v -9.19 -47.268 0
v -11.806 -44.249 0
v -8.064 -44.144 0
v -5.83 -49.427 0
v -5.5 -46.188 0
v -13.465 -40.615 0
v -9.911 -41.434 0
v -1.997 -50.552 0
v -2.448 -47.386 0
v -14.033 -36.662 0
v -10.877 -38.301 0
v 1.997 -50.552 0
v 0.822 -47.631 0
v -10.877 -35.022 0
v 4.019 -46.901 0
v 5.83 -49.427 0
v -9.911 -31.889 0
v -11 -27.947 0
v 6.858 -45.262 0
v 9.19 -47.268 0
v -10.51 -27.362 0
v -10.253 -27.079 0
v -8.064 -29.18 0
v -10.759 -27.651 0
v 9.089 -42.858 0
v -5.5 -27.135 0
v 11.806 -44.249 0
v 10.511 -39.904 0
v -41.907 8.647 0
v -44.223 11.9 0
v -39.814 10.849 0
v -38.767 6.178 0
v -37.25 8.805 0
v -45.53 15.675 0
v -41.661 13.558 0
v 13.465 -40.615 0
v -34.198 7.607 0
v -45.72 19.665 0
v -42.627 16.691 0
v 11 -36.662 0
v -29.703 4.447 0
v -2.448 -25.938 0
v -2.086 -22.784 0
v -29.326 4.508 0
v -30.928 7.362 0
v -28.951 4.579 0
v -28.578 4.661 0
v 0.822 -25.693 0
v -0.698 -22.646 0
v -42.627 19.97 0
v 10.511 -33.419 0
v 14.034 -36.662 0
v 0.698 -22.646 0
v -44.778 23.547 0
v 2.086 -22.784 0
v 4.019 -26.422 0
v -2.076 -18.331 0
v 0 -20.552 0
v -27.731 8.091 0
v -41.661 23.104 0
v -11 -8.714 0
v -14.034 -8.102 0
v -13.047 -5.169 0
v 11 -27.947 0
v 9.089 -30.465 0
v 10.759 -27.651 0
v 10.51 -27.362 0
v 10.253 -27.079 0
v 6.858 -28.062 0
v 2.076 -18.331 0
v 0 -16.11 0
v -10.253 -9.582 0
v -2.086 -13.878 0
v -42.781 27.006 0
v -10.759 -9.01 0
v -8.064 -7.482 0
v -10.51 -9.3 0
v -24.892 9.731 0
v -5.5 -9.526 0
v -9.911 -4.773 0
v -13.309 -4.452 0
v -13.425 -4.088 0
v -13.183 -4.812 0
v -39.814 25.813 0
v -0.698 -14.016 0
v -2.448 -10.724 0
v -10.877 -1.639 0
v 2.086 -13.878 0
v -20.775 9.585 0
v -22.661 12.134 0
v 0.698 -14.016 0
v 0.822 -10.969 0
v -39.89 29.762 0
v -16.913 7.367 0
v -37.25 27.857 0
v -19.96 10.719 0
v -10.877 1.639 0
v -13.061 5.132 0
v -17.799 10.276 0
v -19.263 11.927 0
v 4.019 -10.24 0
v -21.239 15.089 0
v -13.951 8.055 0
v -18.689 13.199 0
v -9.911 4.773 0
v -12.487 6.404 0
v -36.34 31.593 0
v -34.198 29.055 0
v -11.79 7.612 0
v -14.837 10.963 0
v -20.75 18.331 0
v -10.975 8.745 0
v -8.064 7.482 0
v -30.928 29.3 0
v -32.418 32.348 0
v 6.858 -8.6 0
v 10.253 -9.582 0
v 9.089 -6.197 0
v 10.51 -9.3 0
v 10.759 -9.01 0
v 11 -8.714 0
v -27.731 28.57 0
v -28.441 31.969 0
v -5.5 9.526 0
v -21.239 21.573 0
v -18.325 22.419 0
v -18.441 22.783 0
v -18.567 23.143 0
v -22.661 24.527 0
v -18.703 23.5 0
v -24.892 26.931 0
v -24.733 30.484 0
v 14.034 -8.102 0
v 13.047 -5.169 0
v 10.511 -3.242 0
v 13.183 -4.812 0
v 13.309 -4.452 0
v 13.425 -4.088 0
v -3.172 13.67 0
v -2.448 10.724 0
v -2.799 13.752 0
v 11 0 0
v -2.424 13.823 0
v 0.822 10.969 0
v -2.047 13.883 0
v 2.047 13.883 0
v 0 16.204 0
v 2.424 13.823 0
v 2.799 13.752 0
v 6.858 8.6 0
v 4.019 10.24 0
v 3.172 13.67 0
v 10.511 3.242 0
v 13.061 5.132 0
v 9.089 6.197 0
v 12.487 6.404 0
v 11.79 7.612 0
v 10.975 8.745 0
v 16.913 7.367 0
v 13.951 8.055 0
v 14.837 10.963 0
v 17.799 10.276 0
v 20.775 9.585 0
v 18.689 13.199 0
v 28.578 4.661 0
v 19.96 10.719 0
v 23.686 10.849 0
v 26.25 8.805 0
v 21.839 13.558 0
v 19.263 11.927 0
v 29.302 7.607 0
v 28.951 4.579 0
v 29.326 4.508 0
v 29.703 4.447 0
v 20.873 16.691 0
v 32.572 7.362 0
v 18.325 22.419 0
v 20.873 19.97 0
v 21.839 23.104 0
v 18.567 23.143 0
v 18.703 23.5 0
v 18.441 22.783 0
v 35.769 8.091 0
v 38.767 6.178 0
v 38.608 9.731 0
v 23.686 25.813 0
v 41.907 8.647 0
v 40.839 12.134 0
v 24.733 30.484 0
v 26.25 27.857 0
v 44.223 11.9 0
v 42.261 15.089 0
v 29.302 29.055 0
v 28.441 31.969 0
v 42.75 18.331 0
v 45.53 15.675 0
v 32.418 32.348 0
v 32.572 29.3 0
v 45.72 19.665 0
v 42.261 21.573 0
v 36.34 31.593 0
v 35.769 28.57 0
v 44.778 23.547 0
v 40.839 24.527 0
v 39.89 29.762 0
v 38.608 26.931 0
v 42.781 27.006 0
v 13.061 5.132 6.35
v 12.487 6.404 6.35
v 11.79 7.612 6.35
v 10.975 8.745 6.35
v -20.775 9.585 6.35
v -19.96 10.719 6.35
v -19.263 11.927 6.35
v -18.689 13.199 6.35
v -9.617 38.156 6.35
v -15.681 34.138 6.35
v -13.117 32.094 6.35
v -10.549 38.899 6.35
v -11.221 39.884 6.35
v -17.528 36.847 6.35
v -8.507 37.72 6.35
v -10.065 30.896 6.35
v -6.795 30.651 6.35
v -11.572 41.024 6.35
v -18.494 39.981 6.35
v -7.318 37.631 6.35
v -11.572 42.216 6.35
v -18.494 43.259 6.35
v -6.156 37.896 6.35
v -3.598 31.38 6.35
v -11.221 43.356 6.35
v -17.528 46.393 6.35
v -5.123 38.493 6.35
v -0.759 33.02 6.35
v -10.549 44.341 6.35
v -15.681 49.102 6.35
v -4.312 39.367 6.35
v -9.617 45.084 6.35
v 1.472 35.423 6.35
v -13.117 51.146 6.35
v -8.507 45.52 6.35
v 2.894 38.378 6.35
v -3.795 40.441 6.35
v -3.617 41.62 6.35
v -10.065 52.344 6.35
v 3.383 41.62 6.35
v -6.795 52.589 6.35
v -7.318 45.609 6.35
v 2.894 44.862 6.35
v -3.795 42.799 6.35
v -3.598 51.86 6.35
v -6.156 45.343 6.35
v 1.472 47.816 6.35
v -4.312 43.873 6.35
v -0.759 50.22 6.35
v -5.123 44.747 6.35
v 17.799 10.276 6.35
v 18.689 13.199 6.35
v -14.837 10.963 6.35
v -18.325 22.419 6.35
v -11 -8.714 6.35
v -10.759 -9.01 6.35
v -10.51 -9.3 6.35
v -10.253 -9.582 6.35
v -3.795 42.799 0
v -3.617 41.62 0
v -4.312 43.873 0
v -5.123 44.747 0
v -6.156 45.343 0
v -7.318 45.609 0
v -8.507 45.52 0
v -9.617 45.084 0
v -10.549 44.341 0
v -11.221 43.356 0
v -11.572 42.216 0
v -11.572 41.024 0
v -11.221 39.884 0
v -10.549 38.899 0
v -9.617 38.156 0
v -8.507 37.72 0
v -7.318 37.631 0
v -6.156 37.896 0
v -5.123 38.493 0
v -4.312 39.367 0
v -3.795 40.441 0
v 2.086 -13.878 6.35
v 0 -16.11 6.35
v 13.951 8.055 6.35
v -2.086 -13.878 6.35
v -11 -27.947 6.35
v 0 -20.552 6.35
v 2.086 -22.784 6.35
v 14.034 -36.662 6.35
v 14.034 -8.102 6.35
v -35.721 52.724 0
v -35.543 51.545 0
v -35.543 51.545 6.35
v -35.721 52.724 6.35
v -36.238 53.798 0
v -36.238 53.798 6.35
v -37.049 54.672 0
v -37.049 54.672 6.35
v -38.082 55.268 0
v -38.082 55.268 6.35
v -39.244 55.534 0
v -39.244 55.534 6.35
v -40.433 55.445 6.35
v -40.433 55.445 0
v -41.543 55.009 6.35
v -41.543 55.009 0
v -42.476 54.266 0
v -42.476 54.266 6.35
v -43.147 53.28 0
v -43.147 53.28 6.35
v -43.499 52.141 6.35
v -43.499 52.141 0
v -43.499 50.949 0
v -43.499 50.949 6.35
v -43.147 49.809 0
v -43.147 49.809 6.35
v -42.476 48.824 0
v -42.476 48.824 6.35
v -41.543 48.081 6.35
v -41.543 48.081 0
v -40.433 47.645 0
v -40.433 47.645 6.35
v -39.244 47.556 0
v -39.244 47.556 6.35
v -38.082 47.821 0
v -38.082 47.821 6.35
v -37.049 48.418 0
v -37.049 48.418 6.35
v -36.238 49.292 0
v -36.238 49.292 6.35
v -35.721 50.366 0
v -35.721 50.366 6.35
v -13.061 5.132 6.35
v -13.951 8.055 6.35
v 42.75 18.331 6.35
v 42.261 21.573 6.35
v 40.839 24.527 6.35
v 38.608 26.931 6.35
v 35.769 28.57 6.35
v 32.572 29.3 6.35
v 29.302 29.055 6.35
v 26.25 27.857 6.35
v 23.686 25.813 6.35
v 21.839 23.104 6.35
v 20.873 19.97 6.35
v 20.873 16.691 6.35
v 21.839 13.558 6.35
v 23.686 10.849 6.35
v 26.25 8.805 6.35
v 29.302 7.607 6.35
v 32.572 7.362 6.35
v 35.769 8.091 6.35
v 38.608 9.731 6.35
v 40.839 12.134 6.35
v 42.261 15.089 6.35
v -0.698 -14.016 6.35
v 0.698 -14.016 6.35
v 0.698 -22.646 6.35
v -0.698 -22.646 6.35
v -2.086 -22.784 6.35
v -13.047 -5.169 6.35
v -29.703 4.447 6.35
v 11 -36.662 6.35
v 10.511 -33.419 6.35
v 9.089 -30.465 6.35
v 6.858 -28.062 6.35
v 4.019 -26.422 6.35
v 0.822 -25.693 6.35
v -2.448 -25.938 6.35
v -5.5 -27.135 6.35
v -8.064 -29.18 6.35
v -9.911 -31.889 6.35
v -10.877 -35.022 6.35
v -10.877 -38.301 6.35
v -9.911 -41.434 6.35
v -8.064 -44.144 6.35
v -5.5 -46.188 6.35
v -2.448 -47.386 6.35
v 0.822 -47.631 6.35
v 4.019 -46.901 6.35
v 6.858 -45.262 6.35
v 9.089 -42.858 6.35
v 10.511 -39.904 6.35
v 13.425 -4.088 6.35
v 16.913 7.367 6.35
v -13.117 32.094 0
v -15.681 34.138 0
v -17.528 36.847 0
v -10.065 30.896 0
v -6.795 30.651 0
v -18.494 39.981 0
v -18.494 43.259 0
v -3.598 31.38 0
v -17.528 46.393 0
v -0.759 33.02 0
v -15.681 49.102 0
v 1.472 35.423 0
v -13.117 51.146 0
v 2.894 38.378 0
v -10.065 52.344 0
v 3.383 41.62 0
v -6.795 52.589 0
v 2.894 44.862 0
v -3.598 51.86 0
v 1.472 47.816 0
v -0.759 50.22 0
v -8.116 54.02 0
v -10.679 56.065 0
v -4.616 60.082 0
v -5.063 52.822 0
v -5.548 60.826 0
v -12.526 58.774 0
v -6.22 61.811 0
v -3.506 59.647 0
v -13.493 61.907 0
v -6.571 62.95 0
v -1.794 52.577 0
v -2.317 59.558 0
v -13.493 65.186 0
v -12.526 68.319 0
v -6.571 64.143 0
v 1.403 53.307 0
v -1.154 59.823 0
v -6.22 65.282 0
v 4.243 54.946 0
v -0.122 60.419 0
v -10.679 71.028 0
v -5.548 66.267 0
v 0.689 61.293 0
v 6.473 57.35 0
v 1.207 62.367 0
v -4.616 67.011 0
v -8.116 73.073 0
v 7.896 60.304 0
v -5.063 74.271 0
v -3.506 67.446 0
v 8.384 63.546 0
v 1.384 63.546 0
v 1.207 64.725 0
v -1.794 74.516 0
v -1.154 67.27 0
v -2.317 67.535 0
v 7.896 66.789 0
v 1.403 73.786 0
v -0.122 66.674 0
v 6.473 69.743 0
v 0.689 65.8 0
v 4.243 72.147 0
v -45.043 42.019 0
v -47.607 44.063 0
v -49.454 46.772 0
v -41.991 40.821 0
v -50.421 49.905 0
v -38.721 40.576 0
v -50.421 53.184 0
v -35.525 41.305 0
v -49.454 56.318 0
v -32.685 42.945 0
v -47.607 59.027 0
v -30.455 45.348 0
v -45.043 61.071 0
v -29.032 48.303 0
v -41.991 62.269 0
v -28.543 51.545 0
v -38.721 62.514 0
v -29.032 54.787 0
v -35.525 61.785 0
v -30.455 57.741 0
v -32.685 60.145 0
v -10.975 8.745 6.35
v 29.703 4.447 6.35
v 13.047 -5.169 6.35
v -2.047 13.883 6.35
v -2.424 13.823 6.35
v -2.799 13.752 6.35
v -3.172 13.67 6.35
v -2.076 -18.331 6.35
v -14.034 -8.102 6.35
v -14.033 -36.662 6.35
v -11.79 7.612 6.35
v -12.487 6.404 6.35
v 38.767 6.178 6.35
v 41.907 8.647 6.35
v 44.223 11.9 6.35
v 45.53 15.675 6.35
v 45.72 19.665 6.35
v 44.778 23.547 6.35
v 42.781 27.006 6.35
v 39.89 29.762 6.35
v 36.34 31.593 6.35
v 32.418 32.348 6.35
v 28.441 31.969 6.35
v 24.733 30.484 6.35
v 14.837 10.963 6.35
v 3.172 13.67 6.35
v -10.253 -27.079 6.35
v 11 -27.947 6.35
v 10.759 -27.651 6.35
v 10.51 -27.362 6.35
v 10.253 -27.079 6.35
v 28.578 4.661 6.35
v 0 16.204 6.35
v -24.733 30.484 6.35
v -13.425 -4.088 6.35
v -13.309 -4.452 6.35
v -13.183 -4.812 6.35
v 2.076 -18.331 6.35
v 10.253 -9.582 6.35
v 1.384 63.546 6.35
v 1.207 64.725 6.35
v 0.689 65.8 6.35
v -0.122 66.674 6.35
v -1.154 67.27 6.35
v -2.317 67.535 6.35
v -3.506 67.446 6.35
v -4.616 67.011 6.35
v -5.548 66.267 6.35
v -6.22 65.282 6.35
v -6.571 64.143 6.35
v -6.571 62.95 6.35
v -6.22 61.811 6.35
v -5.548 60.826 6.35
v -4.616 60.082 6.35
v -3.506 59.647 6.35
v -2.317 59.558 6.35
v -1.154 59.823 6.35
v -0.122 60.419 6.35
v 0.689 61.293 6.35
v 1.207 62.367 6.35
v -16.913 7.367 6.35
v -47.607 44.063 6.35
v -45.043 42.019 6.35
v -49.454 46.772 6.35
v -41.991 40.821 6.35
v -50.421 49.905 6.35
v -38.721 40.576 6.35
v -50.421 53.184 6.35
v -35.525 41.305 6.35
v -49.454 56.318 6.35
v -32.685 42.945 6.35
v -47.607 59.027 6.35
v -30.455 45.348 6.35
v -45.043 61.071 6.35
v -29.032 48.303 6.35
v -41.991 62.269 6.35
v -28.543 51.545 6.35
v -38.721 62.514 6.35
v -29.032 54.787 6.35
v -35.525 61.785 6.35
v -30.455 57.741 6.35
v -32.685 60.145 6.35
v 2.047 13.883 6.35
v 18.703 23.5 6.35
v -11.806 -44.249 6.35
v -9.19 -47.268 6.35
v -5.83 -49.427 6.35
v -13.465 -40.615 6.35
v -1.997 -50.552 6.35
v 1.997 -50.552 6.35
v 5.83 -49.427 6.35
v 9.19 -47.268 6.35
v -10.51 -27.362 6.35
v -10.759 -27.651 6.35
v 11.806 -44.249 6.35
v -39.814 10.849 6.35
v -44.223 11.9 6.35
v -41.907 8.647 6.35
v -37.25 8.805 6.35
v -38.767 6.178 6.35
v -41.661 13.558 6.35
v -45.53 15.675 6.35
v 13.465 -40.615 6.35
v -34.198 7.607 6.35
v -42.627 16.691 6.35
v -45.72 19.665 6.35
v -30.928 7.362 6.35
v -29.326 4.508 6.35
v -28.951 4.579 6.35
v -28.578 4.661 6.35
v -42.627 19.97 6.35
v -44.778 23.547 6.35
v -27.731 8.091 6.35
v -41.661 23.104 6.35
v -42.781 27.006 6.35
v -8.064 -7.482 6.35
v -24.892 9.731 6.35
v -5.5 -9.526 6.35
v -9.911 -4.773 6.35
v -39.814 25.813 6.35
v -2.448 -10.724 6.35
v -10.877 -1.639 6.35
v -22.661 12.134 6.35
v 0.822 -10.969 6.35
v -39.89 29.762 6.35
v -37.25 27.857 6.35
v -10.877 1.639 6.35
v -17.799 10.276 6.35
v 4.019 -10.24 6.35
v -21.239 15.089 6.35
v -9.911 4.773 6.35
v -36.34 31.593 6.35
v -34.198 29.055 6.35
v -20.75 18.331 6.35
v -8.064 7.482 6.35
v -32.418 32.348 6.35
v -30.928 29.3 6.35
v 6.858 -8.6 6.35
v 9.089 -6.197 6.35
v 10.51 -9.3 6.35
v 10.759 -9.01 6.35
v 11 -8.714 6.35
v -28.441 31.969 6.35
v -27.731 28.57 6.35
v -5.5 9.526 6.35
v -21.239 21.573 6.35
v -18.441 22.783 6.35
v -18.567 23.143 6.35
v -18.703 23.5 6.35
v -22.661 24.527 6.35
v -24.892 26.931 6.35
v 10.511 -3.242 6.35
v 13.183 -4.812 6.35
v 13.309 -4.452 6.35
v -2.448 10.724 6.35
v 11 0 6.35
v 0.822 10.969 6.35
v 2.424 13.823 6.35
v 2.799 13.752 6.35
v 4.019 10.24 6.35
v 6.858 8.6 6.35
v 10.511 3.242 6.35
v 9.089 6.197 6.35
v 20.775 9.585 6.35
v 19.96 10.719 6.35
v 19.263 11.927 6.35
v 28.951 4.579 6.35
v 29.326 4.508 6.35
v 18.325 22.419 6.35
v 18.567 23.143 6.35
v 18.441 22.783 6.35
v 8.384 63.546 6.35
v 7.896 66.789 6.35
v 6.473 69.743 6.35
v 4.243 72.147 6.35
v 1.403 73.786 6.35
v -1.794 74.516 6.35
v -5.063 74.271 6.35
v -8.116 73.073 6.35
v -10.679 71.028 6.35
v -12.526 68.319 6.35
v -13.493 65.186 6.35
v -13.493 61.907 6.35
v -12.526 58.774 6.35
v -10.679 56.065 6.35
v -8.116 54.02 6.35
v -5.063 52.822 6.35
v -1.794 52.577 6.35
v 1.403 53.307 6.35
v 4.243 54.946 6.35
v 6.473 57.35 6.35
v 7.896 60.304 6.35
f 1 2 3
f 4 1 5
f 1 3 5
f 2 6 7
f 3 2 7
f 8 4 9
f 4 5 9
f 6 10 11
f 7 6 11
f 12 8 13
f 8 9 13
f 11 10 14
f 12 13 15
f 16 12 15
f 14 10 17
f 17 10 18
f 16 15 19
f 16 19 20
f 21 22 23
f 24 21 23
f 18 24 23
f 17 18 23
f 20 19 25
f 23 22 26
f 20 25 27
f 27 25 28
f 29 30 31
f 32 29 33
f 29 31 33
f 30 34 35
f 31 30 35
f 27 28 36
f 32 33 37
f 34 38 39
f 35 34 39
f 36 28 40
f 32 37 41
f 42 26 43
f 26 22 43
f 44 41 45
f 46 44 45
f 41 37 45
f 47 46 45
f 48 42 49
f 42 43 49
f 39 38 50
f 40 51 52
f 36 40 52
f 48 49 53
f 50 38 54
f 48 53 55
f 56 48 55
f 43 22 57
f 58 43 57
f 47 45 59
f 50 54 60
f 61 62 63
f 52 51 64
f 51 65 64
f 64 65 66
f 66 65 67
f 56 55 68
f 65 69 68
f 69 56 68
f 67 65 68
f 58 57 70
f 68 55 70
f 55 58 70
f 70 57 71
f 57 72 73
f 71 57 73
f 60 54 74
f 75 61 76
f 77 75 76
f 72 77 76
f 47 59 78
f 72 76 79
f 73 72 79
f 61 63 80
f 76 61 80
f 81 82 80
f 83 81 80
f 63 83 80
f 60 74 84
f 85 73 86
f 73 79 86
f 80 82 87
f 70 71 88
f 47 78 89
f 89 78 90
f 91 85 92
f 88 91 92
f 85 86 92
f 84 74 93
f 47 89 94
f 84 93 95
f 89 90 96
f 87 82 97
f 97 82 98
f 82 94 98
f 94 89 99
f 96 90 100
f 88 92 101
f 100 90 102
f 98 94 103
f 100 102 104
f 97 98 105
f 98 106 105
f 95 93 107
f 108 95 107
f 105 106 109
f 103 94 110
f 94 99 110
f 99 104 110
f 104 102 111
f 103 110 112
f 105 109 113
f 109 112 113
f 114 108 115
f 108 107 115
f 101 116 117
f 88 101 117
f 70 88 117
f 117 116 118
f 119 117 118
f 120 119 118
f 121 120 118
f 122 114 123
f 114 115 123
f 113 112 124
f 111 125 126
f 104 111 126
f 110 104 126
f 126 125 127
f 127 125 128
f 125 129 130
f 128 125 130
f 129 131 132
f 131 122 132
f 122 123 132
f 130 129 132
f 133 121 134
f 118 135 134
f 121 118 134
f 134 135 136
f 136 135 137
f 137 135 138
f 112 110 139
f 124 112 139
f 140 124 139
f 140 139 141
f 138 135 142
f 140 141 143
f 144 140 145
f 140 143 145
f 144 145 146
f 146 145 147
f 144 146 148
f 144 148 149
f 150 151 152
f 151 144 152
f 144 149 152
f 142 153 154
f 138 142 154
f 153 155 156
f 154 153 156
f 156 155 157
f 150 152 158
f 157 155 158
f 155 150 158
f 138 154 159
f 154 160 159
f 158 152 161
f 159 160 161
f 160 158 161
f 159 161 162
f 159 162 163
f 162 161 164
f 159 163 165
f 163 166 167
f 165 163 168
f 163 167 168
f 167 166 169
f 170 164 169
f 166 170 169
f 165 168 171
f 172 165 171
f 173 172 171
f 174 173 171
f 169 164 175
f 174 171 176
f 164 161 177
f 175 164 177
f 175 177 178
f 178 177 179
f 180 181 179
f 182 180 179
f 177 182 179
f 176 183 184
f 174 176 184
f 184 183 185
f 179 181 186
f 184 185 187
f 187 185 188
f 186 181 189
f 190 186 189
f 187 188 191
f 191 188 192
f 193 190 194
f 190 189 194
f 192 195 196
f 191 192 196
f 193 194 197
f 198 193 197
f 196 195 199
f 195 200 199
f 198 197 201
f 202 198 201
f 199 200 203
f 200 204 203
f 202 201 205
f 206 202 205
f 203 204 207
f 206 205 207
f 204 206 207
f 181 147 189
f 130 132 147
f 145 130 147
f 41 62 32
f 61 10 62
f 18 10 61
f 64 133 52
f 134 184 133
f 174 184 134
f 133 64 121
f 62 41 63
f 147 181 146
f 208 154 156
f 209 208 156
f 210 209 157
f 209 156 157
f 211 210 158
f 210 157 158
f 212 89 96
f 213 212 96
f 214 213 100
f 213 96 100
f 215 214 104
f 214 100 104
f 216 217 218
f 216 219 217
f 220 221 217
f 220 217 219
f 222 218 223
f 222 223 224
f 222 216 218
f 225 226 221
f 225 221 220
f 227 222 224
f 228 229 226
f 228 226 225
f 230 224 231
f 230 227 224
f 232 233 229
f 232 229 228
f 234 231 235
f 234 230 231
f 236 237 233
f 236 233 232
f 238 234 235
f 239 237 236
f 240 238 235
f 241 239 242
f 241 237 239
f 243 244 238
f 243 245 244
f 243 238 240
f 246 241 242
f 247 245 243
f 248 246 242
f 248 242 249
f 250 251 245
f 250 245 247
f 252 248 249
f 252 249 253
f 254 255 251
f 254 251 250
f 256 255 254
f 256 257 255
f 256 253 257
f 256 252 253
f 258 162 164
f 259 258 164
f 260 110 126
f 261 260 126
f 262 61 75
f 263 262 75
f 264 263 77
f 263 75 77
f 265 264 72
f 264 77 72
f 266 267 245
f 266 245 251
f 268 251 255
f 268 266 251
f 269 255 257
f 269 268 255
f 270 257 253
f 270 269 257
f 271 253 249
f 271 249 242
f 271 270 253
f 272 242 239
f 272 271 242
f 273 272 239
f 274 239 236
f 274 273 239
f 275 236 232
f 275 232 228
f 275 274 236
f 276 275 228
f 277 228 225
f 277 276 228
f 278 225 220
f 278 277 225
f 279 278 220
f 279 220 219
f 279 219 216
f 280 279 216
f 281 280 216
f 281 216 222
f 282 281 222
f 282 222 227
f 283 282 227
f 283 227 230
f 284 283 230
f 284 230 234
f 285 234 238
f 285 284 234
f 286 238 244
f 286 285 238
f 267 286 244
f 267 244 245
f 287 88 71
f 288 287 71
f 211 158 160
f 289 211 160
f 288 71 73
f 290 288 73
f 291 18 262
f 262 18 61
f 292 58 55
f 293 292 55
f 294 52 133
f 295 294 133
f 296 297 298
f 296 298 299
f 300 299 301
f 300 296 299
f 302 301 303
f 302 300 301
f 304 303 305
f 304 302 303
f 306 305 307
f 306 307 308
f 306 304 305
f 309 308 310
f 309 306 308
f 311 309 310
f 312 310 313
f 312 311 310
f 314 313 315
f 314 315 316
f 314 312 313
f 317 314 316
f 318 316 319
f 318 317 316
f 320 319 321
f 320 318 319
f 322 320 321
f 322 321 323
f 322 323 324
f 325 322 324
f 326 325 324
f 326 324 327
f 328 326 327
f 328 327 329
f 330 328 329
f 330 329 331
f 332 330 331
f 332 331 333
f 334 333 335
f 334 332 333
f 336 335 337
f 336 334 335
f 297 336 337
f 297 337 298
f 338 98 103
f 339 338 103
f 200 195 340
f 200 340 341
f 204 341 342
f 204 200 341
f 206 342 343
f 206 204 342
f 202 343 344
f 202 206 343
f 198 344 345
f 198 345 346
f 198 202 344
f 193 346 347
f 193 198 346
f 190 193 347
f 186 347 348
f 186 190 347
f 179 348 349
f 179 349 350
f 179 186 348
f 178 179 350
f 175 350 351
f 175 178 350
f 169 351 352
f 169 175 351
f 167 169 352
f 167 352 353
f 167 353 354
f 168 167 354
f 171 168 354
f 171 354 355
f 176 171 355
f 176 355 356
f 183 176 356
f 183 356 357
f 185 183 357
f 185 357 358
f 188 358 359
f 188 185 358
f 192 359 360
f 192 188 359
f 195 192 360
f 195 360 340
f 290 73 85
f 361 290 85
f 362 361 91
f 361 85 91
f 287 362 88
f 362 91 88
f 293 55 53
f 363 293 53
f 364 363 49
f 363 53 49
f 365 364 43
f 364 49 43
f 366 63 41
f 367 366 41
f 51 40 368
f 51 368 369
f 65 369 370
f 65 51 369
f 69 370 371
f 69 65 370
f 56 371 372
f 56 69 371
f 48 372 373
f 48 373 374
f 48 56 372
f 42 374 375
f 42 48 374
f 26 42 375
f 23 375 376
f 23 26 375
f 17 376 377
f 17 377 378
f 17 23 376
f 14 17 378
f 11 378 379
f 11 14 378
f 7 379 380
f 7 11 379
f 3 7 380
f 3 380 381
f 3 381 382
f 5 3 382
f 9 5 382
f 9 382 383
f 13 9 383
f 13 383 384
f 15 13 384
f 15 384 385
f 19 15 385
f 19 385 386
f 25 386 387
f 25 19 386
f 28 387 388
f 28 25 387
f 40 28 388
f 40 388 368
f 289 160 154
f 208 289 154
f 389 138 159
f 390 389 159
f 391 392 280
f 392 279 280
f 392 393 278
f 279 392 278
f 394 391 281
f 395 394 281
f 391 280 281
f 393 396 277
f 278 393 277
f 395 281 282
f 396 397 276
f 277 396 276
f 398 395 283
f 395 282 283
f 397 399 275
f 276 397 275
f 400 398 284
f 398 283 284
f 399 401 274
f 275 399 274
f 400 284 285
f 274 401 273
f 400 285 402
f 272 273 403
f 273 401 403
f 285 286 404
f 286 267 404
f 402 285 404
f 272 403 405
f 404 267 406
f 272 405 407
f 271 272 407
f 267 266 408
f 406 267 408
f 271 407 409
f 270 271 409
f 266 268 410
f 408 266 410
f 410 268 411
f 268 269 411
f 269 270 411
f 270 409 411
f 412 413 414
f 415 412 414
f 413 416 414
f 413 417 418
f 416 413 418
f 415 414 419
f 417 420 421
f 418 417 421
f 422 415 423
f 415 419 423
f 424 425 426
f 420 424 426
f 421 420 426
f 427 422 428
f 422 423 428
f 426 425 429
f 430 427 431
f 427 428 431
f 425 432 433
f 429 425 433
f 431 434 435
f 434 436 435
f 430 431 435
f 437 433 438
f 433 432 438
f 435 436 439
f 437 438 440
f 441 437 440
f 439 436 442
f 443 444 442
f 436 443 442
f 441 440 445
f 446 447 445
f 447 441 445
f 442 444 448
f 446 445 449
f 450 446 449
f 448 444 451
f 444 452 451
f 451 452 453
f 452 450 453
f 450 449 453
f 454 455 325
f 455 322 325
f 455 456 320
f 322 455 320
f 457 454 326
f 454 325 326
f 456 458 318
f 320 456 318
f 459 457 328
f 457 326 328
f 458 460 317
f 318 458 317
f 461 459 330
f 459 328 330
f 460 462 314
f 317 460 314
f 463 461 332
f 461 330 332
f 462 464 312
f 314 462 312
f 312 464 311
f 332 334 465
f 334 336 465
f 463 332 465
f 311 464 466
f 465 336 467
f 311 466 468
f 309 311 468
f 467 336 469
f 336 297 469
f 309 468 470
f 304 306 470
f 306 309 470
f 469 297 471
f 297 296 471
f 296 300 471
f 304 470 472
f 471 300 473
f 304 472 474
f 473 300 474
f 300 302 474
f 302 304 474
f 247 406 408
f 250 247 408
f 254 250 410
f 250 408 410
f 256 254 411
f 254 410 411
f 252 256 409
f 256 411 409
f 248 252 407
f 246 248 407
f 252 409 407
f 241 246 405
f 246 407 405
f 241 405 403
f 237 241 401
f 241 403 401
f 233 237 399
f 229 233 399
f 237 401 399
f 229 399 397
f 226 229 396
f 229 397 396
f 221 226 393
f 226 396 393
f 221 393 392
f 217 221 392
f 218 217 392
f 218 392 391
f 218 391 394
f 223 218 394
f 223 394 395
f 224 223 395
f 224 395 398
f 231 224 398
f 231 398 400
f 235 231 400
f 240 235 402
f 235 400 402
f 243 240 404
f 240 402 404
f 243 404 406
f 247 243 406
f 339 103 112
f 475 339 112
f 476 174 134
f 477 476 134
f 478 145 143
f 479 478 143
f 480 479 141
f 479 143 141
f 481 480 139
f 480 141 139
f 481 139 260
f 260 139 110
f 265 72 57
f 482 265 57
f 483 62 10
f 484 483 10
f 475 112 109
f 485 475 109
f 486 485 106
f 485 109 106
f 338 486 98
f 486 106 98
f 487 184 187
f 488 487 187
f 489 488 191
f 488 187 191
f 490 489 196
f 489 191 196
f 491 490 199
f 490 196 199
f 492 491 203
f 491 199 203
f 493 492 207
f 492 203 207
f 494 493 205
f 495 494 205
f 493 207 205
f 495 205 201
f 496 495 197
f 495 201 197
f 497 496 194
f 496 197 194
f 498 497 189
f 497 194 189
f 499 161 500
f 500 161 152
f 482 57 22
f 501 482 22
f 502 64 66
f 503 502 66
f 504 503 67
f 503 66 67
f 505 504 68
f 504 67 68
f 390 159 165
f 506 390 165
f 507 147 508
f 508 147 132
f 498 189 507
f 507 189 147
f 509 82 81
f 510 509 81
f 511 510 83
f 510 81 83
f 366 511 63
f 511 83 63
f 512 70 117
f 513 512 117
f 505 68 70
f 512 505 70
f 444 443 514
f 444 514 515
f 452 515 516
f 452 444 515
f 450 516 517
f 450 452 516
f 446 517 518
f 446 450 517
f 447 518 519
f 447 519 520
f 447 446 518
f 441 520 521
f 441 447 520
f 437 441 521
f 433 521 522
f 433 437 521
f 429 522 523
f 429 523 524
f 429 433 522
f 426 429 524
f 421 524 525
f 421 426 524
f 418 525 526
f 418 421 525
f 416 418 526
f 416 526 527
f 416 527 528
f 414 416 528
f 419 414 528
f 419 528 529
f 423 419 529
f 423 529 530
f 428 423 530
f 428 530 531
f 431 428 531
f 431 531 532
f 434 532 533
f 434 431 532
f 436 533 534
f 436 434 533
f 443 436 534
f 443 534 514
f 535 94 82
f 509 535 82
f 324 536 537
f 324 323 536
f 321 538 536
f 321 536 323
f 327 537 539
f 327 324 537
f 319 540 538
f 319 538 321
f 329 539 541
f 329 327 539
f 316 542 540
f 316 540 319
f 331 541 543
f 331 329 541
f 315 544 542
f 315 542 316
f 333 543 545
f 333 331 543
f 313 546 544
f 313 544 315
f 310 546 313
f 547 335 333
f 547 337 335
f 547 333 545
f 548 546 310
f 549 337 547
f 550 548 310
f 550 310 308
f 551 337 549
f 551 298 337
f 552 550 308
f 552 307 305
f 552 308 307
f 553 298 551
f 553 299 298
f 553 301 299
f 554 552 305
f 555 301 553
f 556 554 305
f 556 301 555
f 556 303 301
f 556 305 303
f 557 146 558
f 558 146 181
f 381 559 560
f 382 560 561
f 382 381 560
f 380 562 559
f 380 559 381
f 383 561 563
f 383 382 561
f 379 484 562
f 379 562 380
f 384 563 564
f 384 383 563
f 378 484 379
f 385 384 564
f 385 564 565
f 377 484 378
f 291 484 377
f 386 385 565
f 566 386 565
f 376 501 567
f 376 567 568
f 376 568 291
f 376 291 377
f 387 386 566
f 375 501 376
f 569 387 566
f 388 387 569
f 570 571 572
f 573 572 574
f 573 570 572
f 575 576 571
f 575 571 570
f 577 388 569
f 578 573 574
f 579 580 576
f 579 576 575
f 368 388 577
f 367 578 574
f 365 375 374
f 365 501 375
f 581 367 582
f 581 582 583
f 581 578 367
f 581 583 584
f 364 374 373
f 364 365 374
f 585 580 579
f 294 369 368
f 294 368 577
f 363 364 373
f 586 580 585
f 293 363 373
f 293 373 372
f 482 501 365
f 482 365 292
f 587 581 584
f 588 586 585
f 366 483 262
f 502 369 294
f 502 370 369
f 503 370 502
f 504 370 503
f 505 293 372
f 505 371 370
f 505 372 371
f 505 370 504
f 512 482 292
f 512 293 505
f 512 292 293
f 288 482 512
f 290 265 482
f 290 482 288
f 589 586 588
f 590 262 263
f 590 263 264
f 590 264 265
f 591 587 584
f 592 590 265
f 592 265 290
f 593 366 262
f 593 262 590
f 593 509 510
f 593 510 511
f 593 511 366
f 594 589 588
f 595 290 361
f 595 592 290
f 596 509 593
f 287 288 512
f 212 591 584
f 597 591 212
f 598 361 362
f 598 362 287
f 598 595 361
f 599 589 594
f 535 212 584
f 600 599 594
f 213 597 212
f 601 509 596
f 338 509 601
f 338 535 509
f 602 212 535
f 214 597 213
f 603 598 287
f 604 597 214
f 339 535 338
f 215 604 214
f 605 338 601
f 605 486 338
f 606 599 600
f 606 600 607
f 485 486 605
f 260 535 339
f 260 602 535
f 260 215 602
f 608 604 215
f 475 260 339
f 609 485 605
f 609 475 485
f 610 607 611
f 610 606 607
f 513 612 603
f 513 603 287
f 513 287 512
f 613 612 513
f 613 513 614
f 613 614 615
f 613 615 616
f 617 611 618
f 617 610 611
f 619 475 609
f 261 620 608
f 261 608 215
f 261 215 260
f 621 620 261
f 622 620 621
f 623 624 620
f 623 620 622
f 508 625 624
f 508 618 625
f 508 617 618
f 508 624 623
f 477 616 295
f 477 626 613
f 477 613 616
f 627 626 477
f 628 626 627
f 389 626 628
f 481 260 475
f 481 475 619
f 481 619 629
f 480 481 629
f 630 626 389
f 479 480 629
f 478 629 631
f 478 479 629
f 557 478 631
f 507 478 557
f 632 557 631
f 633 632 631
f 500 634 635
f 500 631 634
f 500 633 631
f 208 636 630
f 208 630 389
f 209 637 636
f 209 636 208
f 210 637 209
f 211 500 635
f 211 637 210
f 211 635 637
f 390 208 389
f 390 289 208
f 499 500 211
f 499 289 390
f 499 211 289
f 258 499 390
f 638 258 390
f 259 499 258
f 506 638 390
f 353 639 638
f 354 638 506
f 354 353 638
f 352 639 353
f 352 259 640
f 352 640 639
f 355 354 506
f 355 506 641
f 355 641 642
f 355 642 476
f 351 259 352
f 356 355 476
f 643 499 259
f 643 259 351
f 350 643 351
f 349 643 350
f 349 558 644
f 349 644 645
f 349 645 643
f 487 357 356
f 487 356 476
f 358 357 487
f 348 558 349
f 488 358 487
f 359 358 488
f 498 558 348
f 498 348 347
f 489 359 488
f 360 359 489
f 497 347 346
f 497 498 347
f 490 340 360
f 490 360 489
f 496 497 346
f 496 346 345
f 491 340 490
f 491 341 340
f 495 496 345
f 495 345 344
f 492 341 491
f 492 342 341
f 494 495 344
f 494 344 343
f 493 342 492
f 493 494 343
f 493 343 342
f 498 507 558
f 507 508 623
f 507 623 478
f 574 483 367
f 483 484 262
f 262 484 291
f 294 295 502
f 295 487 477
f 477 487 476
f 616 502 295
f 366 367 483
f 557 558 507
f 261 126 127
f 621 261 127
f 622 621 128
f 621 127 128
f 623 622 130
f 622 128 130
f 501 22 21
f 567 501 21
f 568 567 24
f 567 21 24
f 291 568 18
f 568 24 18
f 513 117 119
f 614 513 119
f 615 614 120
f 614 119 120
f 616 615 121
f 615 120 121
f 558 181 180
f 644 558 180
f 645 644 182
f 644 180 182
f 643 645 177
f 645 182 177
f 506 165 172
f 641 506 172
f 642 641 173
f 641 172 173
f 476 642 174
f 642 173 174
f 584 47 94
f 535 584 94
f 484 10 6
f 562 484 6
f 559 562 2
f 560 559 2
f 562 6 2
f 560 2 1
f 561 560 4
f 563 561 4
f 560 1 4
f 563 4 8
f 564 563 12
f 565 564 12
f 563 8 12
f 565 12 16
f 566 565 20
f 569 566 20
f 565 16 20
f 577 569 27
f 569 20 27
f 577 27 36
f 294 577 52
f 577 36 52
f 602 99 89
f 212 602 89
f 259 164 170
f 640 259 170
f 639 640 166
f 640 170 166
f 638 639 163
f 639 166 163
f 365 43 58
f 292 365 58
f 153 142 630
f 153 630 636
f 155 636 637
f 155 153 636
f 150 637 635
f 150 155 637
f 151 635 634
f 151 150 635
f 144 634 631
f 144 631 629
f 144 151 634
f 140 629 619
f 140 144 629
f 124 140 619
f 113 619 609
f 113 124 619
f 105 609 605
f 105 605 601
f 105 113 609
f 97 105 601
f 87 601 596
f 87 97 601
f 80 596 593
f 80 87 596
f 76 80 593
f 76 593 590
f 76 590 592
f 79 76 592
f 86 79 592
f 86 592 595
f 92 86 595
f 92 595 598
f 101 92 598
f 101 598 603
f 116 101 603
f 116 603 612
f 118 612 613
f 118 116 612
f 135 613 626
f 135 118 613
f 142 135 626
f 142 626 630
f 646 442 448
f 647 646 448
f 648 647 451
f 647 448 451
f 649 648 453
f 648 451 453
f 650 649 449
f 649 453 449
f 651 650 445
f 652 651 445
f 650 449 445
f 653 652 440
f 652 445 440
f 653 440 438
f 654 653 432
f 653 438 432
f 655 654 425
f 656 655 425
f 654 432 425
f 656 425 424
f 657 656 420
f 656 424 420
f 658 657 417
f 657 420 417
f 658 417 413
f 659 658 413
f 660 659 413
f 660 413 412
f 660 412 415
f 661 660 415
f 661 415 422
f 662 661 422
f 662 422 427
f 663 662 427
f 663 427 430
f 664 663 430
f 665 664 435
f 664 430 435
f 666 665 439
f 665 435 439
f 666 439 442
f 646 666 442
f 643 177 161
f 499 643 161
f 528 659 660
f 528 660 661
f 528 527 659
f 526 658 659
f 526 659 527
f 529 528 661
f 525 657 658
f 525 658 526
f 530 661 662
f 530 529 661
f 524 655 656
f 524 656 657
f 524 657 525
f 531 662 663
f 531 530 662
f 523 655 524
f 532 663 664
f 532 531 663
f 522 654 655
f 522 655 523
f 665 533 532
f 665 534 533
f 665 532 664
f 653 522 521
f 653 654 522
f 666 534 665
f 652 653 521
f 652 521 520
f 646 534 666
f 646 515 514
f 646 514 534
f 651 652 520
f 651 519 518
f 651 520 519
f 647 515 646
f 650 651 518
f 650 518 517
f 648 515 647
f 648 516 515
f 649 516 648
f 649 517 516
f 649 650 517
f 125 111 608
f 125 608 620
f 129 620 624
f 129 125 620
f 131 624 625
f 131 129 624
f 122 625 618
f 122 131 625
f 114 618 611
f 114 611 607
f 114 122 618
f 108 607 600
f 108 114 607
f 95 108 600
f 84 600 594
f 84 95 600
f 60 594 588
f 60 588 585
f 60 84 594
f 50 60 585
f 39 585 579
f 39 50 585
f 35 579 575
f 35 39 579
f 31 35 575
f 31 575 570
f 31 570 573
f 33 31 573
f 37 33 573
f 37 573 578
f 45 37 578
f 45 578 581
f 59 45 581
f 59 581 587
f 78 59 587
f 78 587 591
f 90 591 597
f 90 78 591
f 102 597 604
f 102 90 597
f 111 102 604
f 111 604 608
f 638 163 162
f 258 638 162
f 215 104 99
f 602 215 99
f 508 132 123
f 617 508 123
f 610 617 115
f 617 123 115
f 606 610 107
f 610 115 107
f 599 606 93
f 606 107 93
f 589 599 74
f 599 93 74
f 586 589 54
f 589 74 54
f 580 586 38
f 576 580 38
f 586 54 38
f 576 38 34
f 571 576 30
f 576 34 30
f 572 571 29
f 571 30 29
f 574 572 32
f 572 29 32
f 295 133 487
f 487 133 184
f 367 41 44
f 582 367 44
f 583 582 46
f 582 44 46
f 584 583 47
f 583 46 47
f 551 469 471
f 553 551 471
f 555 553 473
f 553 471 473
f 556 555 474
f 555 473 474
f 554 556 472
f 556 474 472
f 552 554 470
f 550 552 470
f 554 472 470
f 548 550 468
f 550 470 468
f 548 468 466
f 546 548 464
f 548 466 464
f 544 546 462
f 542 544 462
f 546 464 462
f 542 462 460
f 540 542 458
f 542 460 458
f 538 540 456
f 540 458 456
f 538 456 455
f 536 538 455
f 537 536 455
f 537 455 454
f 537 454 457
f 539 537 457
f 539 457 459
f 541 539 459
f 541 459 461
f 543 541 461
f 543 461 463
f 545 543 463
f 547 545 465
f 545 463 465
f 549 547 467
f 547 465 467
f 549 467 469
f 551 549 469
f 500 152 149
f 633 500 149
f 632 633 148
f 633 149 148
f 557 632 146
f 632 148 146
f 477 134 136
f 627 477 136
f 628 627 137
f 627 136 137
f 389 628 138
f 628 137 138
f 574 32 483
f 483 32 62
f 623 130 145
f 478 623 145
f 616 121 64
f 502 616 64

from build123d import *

# Parameters (mm, degrees)
F0_R     = 11
F0_R_2   = 4
F1_DEPTH = 6.35


with BuildPart() as f1:
    # F0 (on Top) → F1 (new body)
    with BuildSketch(Plane.XY):
        with BuildLine():
            Line((24.73325, 30.484239), (0, 16.20449))
            Line((0, 16.20449), (-24.73325, 30.484239))
            ThreePointArc((-24.73325, 30.484239), (-43.903368, 25.347621), (-38.76675, 6.177504))
            Line((-38.76675, 6.177504), (-14.0335, -8.102245))
            Line((-14.0335, -8.102245), (-14.0335, -36.661742))
            ThreePointArc((-14.0335, -36.661742), (0, -50.695242), (14.0335, -36.661742))
            Line((14.0335, -36.661742), (14.0335, -8.102245))
            Line((14.0335, -8.102245), (38.76675, 6.177504))
            ThreePointArc((38.76675, 6.177504), (43.903368, 25.347621), (24.73325, 30.484239))
        make_face()
        with BuildLine():
            Line((-2.076081, -18.330871), (-10.252641, -27.079338))
            ThreePointArc((-10.252641, -27.079338), (-10.635182, -27.505759), (-11, -27.947436))
            Line((-11, -27.947436), (-11, -8.714306))
            ThreePointArc((-11, -8.714306), (-10.635182, -9.155983), (-10.252641, -9.582404))
            Line((-10.252641, -9.582404), (-2.076081, -18.330871))
        make_face(mode=Mode.SUBTRACT)
        with BuildLine():
            Line((-16.91304, 7.367497), (-13.424926, -4.087846))
            ThreePointArc((-13.424926, -4.087846), (-13.246905, -4.632346), (-13.04681, -5.169127))
            Line((-13.04681, -5.169127), (-29.70319, 4.447439))
            ThreePointArc((-29.70319, 4.447439), (-29.138277, 4.542542), (-28.577715, 4.660621))
            Line((-28.577715, 4.660621), (-16.91304, 7.367497))
        make_face(mode=Mode.SUBTRACT)
        with BuildLine():
            Line((-17.798695, 10.276081), (-20.774701, 9.585477))
            ThreePointArc((-20.774701, 9.585477), (-19.596632, 11.314121), (-18.688617, 13.19868))
            Line((-18.688617, 13.19868), (-17.798695, 10.276081))
        make_face(mode=Mode.SUBTRACT)
        with BuildLine():
            Line((-13.061383, 5.132191), (-13.951305, 8.05479))
            Line((-13.951305, 8.05479), (-10.975299, 8.745394))
            ThreePointArc((-10.975299, 8.745394), (-12.153368, 7.01675), (-13.061383, 5.132191))
        make_face(mode=Mode.SUBTRACT)
        with Locations((0, -36.661742)):
            Circle(F0_R, mode=Mode.SUBTRACT)
        with BuildLine():
            ThreePointArc((2.086084, -22.784157), (0, -22.628242), (-2.086084, -22.784157))
            Line((-2.086084, -22.784157), (0, -20.552162))
            Line((0, -20.552162), (2.086084, -22.784157))
        make_face(mode=Mode.SUBTRACT)
        with BuildLine():
            Line((0, -16.10958), (-2.086084, -13.877585))
            ThreePointArc((-2.086084, -13.877585), (0, -14.0335), (2.086084, -13.877585))
            Line((2.086084, -13.877585), (0, -16.10958))
        make_face(mode=Mode.SUBTRACT)
        with BuildLine():
            Line((11, -8.714306), (11, -27.947436))
            ThreePointArc((11, -27.947436), (10.635182, -27.505759), (10.252641, -27.079338))
            Line((10.252641, -27.079338), (2.076081, -18.330871))
            Line((2.076081, -18.330871), (10.252641, -9.582404))
            ThreePointArc((10.252641, -9.582404), (10.635182, -9.155983), (11, -8.714306))
        make_face(mode=Mode.SUBTRACT)
        Circle(F0_R, mode=Mode.SUBTRACT)
        with BuildLine():
            Line((29.70319, 4.447439), (13.04681, -5.169127))
            ThreePointArc((13.04681, -5.169127), (13.246905, -4.632346), (13.424926, -4.087846))
            Line((13.424926, -4.087846), (16.91304, 7.367497))
            Line((16.91304, 7.367497), (28.577715, 4.660621))
            ThreePointArc((28.577715, 4.660621), (29.138277, 4.542542), (29.70319, 4.447439))
        make_face(mode=Mode.SUBTRACT)
        with BuildLine():
            Line((13.951305, 8.05479), (13.061383, 5.132191))
            ThreePointArc((13.061383, 5.132191), (12.153368, 7.01675), (10.975299, 8.745394))
            Line((10.975299, 8.745394), (13.951305, 8.05479))
        make_face(mode=Mode.SUBTRACT)
        with BuildLine():
            Line((17.798695, 10.276081), (18.688617, 13.19868))
            ThreePointArc((18.688617, 13.19868), (19.596632, 11.314121), (20.774701, 9.585477))
            Line((20.774701, 9.585477), (17.798695, 10.276081))
        make_face(mode=Mode.SUBTRACT)
        with Locations((-31.75, 18.330871)):
            Circle(F0_R, mode=Mode.SUBTRACT)
        with BuildLine():
            Line((-14.83696, 10.963374), (-18.325074, 22.418717))
            ThreePointArc((-18.325074, 22.418717), (-18.503095, 22.963217), (-18.70319, 23.499998))
            Line((-18.70319, 23.499998), (-2.04681, 13.883432))
            ThreePointArc((-2.04681, 13.883432), (-2.611723, 13.788329), (-3.172285, 13.67025))
            Line((-3.172285, 13.67025), (-14.83696, 10.963374))
        make_face(mode=Mode.SUBTRACT)
        with BuildLine():
            ThreePointArc((3.172285, 13.67025), (2.611723, 13.788329), (2.04681, 13.883432))
            Line((2.04681, 13.883432), (18.70319, 23.499998))
            ThreePointArc((18.70319, 23.499998), (18.503095, 22.963217), (18.325074, 22.418717))
            Line((18.325074, 22.418717), (14.83696, 10.963374))
            Line((14.83696, 10.963374), (3.172285, 13.67025))
        make_face(mode=Mode.SUBTRACT)
        with Locations((31.75, 18.330871)):
            Circle(F0_R, mode=Mode.SUBTRACT)
        with Locations((-39.543405, 51.544905)):
            Circle(F0_R)
        with Locations((-39.543405, 51.544905)):
            Circle(F0_R_2, mode=Mode.SUBTRACT)
        with Locations((-7.616933, 41.619973)):
            Circle(F0_R)
        with Locations((-7.616933, 41.619973)):
            Circle(F0_R_2, mode=Mode.SUBTRACT)
        with Locations((-2.615711, 63.546404)):
            Circle(F0_R)
        with Locations((-2.615711, 63.546404)):
            Circle(F0_R_2, mode=Mode.SUBTRACT)
    extrude(amount=F1_DEPTH)


solid = f1.part
